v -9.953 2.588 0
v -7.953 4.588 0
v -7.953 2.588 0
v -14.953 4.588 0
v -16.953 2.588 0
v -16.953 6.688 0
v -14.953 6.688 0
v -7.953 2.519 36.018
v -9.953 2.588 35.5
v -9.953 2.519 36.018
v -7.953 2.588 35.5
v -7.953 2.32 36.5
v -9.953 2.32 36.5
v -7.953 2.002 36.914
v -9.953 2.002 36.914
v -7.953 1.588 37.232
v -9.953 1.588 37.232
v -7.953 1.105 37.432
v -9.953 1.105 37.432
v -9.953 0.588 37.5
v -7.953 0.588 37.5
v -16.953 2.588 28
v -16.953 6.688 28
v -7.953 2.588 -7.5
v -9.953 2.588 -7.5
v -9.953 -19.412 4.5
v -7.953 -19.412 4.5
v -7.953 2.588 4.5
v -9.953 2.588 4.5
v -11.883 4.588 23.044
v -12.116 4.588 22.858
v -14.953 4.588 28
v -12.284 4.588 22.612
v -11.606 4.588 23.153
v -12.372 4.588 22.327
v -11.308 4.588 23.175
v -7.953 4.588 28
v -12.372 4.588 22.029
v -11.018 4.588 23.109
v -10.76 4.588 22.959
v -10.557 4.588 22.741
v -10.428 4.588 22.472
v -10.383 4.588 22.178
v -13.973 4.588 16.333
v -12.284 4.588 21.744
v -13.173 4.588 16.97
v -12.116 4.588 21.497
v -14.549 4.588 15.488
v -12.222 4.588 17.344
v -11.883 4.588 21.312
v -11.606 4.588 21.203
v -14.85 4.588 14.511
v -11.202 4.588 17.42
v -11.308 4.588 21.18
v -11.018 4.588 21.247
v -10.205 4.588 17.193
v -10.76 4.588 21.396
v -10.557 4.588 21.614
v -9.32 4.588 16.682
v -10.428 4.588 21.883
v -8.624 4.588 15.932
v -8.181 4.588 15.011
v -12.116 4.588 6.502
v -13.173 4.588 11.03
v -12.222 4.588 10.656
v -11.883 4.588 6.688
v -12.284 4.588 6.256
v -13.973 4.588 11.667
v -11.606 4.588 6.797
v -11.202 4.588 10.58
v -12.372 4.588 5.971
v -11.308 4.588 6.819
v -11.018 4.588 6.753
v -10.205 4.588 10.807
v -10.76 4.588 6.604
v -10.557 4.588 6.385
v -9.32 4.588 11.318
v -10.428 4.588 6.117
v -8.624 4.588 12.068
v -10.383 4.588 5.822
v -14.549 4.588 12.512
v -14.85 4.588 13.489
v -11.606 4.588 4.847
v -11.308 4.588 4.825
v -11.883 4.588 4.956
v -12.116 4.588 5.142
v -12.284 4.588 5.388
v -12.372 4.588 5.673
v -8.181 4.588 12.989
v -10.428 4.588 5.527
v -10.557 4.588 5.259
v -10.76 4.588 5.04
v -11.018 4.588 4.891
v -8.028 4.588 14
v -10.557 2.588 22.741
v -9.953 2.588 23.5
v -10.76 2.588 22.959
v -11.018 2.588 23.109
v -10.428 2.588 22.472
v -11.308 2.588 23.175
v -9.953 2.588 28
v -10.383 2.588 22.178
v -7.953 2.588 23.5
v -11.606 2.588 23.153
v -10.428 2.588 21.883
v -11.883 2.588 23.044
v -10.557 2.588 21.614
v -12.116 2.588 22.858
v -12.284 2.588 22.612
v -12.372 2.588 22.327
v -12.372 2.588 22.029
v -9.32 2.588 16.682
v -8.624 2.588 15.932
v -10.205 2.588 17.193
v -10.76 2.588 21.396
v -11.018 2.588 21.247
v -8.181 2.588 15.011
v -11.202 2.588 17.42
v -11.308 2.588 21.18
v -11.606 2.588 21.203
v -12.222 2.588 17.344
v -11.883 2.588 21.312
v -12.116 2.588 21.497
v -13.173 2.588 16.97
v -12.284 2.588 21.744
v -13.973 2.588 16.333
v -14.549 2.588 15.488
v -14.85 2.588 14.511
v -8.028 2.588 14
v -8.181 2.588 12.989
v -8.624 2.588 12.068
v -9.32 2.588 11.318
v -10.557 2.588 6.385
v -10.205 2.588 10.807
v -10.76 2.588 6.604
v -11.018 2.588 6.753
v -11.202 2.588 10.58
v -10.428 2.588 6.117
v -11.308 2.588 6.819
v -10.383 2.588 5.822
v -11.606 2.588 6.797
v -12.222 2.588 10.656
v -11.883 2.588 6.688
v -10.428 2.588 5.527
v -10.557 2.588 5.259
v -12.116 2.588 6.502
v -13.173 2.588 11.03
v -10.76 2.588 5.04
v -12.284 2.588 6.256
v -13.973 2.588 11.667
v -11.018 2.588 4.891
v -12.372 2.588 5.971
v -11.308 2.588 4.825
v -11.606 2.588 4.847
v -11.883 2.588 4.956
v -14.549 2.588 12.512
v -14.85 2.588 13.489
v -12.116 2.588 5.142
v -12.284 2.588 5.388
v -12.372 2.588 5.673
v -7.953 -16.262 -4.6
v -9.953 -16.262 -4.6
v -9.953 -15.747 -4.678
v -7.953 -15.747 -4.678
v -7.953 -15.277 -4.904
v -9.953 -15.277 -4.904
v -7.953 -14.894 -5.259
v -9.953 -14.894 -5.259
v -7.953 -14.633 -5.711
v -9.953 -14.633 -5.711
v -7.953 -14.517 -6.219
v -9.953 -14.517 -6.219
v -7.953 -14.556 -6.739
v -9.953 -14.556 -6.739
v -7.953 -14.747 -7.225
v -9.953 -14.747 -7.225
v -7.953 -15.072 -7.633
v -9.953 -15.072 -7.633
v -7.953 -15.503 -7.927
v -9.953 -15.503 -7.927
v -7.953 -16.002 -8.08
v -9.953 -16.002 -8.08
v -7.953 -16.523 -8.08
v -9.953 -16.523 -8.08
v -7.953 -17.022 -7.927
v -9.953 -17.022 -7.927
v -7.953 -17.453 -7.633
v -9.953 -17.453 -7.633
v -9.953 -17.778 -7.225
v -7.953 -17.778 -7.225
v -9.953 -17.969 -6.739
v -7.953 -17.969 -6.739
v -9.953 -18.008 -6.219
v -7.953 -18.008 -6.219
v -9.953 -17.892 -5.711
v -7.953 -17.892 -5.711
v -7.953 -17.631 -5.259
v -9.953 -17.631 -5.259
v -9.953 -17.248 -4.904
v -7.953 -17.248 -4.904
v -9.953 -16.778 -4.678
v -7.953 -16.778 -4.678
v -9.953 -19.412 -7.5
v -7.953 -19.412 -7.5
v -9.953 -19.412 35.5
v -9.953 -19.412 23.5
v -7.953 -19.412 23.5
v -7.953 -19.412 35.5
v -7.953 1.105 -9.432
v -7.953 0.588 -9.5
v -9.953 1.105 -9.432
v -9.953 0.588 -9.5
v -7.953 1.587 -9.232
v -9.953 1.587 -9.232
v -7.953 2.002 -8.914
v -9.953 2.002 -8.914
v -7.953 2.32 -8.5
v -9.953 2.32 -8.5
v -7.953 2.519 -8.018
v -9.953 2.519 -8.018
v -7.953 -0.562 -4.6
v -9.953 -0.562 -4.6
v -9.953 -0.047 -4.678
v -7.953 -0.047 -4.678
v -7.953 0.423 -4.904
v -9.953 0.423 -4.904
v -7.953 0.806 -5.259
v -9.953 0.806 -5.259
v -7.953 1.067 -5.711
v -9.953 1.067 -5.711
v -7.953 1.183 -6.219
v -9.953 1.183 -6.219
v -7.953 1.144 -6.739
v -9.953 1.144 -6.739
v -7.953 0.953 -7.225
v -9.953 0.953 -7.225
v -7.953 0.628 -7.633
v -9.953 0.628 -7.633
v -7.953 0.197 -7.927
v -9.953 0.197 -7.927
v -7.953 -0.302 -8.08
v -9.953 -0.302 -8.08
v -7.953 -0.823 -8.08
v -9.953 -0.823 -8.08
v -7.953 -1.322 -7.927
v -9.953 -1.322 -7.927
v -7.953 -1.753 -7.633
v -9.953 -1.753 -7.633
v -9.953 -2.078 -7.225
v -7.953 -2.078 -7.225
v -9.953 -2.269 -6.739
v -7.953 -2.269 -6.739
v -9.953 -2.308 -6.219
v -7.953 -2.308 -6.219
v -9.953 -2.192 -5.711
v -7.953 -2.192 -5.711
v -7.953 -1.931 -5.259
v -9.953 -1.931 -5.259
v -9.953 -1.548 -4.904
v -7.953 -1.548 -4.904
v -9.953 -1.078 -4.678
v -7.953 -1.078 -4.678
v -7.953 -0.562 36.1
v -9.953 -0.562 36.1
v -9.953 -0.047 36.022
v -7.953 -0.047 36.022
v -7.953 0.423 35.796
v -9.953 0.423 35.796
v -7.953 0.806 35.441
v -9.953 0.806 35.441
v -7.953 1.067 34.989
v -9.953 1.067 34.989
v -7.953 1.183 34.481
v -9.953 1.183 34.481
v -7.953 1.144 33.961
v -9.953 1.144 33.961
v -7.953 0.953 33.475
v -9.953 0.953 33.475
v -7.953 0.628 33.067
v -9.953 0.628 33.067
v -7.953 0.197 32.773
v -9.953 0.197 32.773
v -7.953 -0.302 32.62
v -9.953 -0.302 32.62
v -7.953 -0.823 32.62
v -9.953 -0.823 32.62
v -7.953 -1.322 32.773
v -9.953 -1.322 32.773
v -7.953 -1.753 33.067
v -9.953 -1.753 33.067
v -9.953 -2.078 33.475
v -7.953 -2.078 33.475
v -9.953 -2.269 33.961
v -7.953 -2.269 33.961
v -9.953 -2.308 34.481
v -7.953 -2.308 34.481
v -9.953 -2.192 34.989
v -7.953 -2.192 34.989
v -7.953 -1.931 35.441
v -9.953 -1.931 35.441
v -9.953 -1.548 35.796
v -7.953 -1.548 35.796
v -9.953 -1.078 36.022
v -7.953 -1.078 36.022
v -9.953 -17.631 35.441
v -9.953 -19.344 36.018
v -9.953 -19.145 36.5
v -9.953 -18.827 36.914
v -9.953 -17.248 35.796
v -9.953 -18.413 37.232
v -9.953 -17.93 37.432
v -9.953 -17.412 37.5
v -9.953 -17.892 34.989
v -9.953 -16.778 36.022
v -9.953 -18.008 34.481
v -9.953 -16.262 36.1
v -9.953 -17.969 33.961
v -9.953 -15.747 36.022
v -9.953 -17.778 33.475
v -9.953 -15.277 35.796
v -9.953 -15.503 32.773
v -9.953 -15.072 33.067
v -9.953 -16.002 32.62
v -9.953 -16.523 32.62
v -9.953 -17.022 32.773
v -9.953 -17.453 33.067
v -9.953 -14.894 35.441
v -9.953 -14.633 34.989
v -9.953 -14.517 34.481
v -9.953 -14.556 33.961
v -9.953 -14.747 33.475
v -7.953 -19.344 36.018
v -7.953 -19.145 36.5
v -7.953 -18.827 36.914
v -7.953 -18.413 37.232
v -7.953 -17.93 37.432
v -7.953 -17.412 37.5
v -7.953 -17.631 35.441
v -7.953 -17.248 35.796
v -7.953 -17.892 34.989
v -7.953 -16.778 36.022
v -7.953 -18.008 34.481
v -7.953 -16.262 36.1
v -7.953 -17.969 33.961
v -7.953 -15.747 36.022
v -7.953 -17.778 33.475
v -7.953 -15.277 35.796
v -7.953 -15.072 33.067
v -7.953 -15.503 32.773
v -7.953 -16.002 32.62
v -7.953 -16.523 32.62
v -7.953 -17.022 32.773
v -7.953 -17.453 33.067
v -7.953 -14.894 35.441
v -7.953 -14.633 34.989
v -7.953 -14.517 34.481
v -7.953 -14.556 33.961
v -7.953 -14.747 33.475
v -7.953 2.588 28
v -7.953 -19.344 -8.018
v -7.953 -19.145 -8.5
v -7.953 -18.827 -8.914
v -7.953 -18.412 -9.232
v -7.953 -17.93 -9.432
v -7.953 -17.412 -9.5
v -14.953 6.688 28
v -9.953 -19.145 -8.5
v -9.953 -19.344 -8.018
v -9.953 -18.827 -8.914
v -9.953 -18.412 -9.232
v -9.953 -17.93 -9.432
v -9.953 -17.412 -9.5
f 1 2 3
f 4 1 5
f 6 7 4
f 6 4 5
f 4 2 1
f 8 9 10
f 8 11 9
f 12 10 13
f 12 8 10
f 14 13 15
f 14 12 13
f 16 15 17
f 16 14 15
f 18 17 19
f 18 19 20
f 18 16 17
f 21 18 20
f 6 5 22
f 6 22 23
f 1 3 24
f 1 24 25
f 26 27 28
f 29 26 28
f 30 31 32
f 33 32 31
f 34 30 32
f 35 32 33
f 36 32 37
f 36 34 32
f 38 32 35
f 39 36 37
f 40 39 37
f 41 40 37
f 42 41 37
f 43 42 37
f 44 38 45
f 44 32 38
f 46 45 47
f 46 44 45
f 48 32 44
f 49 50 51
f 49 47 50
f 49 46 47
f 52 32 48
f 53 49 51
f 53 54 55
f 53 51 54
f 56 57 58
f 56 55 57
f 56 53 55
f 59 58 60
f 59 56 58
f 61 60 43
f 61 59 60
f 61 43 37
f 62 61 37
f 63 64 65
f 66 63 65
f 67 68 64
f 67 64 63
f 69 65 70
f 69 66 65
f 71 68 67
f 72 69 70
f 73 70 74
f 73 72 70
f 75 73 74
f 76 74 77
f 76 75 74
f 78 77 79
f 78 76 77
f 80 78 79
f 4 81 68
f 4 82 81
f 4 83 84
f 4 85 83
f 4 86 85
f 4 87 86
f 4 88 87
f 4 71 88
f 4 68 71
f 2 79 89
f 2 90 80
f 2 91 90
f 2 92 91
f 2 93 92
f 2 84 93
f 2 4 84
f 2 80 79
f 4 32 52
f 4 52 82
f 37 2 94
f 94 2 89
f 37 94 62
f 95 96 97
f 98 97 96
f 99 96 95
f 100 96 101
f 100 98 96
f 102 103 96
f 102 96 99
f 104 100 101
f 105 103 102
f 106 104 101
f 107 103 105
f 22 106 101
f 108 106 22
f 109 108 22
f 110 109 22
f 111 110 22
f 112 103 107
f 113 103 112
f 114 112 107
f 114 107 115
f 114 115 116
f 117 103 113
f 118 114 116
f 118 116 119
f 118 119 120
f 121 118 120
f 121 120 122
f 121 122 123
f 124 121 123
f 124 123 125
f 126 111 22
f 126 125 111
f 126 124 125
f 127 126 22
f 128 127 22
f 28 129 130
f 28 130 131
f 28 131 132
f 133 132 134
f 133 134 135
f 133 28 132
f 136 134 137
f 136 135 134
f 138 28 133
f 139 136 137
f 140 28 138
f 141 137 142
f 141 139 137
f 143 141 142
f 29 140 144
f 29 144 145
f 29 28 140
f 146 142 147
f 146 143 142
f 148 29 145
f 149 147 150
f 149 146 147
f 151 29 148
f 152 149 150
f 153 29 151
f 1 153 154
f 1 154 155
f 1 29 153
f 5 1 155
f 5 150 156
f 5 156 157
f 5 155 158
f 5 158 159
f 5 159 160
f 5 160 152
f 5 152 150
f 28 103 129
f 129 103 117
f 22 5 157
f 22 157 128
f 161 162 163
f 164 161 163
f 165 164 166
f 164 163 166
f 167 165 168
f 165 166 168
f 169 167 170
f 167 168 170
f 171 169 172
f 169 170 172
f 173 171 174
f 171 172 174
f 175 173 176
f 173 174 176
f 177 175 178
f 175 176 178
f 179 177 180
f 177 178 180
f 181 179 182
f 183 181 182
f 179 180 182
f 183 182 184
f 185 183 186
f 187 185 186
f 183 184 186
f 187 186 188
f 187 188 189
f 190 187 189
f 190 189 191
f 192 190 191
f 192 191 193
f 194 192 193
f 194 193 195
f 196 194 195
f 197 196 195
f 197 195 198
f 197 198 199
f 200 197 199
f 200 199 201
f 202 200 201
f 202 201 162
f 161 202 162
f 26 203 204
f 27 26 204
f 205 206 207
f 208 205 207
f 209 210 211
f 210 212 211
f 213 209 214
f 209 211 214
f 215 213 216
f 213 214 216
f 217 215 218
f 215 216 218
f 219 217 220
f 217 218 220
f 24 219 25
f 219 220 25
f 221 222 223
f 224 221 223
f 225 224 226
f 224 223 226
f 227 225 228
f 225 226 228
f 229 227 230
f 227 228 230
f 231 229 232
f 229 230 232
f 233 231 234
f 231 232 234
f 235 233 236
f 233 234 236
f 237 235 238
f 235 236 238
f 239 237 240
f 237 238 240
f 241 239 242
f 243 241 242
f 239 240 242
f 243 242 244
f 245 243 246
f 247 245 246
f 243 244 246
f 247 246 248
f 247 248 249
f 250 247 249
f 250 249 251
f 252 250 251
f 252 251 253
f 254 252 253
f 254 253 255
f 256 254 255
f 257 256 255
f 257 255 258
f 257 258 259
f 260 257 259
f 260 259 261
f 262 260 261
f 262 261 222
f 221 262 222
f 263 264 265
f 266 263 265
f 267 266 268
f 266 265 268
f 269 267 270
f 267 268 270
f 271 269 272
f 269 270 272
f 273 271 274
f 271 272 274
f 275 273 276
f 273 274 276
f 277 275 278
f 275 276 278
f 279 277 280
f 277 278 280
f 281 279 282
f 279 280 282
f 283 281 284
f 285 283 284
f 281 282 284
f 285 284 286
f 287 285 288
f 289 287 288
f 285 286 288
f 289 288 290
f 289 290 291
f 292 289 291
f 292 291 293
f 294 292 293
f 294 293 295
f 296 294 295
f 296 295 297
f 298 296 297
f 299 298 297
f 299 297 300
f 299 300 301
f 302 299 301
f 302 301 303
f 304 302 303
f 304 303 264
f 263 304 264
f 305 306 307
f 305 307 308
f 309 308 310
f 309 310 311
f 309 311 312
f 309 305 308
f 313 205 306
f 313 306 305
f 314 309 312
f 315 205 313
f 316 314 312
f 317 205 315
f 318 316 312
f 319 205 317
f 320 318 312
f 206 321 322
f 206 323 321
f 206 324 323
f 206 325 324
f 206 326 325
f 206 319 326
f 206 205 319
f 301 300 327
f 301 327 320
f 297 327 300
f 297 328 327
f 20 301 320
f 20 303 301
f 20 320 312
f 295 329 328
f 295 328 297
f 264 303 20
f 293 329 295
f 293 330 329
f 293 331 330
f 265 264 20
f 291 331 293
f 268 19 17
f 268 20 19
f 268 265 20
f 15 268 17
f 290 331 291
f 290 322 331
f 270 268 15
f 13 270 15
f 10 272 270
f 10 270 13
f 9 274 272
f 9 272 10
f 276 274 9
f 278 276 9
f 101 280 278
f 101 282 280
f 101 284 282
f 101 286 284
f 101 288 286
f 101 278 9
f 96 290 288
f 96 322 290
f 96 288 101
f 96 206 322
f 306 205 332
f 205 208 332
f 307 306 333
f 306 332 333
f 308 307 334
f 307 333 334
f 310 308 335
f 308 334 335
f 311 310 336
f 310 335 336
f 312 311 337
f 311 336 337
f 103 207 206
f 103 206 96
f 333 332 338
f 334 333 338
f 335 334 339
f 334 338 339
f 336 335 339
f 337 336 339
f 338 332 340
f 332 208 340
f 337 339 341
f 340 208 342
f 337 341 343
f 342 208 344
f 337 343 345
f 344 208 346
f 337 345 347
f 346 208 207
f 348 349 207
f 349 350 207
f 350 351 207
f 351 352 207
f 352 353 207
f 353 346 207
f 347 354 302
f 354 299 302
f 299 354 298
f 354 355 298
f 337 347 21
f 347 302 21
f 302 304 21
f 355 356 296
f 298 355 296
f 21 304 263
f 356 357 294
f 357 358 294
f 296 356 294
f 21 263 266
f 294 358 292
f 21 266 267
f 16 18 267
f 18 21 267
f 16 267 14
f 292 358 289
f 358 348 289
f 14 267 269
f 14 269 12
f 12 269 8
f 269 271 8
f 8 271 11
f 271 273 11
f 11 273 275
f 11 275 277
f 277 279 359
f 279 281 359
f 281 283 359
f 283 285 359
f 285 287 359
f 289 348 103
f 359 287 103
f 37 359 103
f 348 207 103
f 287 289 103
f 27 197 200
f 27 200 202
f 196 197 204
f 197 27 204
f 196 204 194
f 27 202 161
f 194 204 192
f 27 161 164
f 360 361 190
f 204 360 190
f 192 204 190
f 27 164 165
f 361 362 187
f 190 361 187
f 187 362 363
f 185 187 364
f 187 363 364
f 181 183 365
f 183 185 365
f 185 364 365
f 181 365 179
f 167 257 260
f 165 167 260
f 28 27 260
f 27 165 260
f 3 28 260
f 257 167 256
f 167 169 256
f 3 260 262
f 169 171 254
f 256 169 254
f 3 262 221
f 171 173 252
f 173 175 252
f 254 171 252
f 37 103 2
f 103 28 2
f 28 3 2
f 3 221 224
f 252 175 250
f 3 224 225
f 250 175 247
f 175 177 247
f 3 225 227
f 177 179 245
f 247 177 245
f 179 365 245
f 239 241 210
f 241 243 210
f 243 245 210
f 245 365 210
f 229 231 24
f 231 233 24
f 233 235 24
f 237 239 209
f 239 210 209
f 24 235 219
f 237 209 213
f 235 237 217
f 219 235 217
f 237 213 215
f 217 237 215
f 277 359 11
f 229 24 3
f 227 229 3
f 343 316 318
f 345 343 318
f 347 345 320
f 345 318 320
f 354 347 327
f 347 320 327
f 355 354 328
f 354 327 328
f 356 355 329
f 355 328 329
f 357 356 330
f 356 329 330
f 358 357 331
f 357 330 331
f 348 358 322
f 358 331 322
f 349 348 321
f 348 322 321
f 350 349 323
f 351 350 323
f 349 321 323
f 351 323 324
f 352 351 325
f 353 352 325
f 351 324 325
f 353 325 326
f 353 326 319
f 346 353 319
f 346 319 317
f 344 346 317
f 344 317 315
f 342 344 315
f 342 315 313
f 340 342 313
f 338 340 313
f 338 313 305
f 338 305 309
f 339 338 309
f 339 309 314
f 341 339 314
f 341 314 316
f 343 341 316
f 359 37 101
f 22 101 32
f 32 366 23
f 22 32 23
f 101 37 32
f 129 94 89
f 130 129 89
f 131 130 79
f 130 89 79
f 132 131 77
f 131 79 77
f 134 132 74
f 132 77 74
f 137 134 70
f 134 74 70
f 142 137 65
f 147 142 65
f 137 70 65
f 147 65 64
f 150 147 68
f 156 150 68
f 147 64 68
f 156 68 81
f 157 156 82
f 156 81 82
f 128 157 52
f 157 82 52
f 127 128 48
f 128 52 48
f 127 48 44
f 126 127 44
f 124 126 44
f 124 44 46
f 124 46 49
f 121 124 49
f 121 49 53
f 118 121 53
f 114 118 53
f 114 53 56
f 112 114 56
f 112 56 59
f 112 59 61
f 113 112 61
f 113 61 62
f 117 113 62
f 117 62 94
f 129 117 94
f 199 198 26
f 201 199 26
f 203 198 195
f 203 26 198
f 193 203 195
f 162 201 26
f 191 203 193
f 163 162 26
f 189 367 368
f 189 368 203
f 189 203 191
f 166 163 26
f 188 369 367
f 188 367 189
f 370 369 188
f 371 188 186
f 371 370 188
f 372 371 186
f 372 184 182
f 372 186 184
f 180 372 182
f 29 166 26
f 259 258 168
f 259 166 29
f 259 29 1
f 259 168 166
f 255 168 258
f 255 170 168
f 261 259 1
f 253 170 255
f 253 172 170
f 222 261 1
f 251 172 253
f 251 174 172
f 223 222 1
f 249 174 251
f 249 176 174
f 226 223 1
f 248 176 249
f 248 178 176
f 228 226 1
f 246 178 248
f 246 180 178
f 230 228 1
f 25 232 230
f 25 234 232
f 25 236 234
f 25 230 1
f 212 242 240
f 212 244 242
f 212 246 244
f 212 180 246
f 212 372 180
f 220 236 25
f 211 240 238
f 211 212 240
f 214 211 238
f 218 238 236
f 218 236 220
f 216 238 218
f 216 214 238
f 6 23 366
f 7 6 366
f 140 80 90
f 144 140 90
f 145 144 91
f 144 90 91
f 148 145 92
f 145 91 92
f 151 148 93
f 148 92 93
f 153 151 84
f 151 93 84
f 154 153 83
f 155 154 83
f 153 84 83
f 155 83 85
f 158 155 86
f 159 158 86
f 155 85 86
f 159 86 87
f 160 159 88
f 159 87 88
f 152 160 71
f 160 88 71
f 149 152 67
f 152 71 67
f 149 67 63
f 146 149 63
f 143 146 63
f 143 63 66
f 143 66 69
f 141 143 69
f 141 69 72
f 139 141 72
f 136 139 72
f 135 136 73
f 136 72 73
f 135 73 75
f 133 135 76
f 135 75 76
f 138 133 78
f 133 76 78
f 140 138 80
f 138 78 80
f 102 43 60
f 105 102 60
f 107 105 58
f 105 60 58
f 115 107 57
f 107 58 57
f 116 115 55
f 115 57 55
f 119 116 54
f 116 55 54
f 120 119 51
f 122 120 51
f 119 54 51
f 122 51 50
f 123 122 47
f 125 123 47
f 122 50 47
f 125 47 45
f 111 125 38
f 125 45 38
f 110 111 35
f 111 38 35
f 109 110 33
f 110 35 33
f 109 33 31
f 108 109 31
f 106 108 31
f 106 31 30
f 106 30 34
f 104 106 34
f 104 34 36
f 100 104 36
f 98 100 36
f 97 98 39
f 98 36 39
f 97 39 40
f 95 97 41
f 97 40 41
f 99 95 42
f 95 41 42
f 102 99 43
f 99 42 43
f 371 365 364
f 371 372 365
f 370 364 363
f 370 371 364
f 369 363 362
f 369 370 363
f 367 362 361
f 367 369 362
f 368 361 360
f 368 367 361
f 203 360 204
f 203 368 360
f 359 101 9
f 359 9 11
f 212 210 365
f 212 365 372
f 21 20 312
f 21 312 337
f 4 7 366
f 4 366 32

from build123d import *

# Parameters (mm, degrees)
BOSS_EXTRUDE3_DEPTH = 28
SKETCH4_R           = 3.43
SKETCH4_R_2         = 1
CUT_EXTRUDE1_DEPTH  = 2
SKETCH6_W           = 2
SKETCH6_H           = 22
BOSS_EXTRUDE4_DEPTH = 9.5
SKETCH7_W           = 2
SKETCH7_H           = 22
BOSS_EXTRUDE5_DEPTH = 9.5
FILLET1_R           = 2
FILLET2_R           = 2
FILLET3_R           = 2
CUT_EXTRUDE2_REACH  = 4
SKETCH8_R           = 1.75
CUT_EXTRUDE3_REACH  = 11
SKETCH9_W           = 19
SKETCH9_H           = 22


with BuildPart() as part:
    # Sketch3 → Boss-Extrude3 (new body)
    with BuildSketch(Plane.XY):
        Polygon((-16.953175304, 6.6875), (-14.953175304, 6.6875), (-14.953175304, 4.5875), (-7.953175304, 4.5875), (-7.953175304, -19.4125), (-9.953175304, -19.4125), (-9.953175304, 2.5875), (-16.953175304, 2.5875), align=None)
    extrude(amount=BOSS_EXTRUDE3_DEPTH)

    # Sketch4 → Cut-Extrude1 (cut)
    with BuildSketch(Plane(origin=(0, 4.5875, 0), x_dir=(1, 0, 0), z_dir=(0, 1, 0))):
        with Locations((-11.458423587, -14)):
            Circle(SKETCH4_R)
        with Locations((-11.383175304, -5.822)):
            Circle(SKETCH4_R_2)
        with Locations((-11.383175304, -22.177653801)):
            Circle(SKETCH4_R_2)
    extrude(amount=-CUT_EXTRUDE1_DEPTH, mode=Mode.SUBTRACT)

    # Sketch6 → Boss-Extrude4 (add)
    with BuildSketch(Plane(origin=(0, 0, 0), x_dir=(-1, 0, 0), z_dir=(0, 0, -1))):
        with Locations((8.953175304, -8.4125)):
            Rectangle(SKETCH6_W, SKETCH6_H)
    extrude(amount=BOSS_EXTRUDE4_DEPTH)

    # Sketch7 → Boss-Extrude5 (add)
    with BuildSketch(Plane.XY.offset(28)):
        with Locations((-8.953175304, -8.4125)):
            Rectangle(SKETCH7_W, SKETCH7_H)
    extrude(amount=BOSS_EXTRUDE5_DEPTH)

    # Fillet1
    fillet1_edges = [part.edges().sort_by_distance(p)[0] for p in [
        (-8.953175304, 2.5875, 37.5),
    ]]
    fillet(fillet1_edges, radius=FILLET1_R)

    # Fillet2
    fillet2_edges = [part.edges().sort_by_distance(p)[0] for p in [
        (-8.953175304, 2.5875, -9.5),
    ]]
    fillet(fillet2_edges, radius=FILLET2_R)

    # Fillet3
    fillet3_edges = [part.edges().sort_by_distance(p)[0] for p in [
        (-8.953175304, -19.4125, -9.5),
        (-8.953175304, -19.4125, 37.5),
    ]]
    fillet(fillet3_edges, radius=FILLET3_R)

    # Sketch8 → Cut-Extrude2 (cut, up to next)
    with BuildSketch(Plane.ZY.offset(9.953175304), mode=Mode.PRIVATE) as cut_extrude2_sk1:
        with Locations((34.35, -0.5625)):
            Circle(SKETCH8_R)
    cut_extrude2_tool1 = extrude(cut_extrude2_sk1.sketch, amount=-CUT_EXTRUDE2_REACH, mode=Mode.PRIVATE) & part.part
    add(cut_extrude2_tool1.solids().sort_by_distance((-9.953175, -0.5625, 34.35))[0], mode=Mode.SUBTRACT)
    # Sketch8 → Cut-Extrude2 (cut, up to next)
    with BuildSketch(Plane.ZY.offset(9.953175304), mode=Mode.PRIVATE) as cut_extrude2_sk2:
        with Locations((-6.35, -0.5625)):
            Circle(SKETCH8_R)
    cut_extrude2_tool2 = extrude(cut_extrude2_sk2.sketch, amount=-CUT_EXTRUDE2_REACH, mode=Mode.PRIVATE) & part.part
    add(cut_extrude2_tool2.solids().sort_by_distance((-9.953175, -0.5625, -6.35))[0], mode=Mode.SUBTRACT)
    # Sketch8 → Cut-Extrude2 (cut, up to next)
    with BuildSketch(Plane.ZY.offset(9.953175304), mode=Mode.PRIVATE) as cut_extrude2_sk3:
        with Locations((-6.35, -16.2625)):
            Circle(SKETCH8_R)
    cut_extrude2_tool3 = extrude(cut_extrude2_sk3.sketch, amount=-CUT_EXTRUDE2_REACH, mode=Mode.PRIVATE) & part.part
    add(cut_extrude2_tool3.solids().sort_by_distance((-9.953175, -16.2625, -6.35))[0], mode=Mode.SUBTRACT)
    # Sketch8 → Cut-Extrude2 (cut, up to next)
    with BuildSketch(Plane.ZY.offset(9.953175304), mode=Mode.PRIVATE) as cut_extrude2_sk4:
        with Locations((34.35, -16.2625)):
            Circle(SKETCH8_R)
    cut_extrude2_tool4 = extrude(cut_extrude2_sk4.sketch, amount=-CUT_EXTRUDE2_REACH, mode=Mode.PRIVATE) & part.part
    add(cut_extrude2_tool4.solids().sort_by_distance((-9.953175, -16.2625, 34.35))[0], mode=Mode.SUBTRACT)

    # Sketch9 → Cut-Extrude3 (cut, up to next)
    with BuildSketch(Plane(origin=(-7.953175304, 0, 0), x_dir=(0, 0, -1), z_dir=(1, 0, 0)), mode=Mode.PRIVATE) as cut_extrude3_sk1:
        with Locations((-14, -8.4125)):
            Rectangle(SKETCH9_W, SKETCH9_H)
    cut_extrude3_tool1 = extrude(cut_extrude3_sk1.sketch, amount=-CUT_EXTRUDE3_REACH, mode=Mode.PRIVATE) & part.part
    add(cut_extrude3_tool1.solids().sort_by_distance((-7.953175, -8.4125, 14))[0], mode=Mode.SUBTRACT)


solid = part.part
